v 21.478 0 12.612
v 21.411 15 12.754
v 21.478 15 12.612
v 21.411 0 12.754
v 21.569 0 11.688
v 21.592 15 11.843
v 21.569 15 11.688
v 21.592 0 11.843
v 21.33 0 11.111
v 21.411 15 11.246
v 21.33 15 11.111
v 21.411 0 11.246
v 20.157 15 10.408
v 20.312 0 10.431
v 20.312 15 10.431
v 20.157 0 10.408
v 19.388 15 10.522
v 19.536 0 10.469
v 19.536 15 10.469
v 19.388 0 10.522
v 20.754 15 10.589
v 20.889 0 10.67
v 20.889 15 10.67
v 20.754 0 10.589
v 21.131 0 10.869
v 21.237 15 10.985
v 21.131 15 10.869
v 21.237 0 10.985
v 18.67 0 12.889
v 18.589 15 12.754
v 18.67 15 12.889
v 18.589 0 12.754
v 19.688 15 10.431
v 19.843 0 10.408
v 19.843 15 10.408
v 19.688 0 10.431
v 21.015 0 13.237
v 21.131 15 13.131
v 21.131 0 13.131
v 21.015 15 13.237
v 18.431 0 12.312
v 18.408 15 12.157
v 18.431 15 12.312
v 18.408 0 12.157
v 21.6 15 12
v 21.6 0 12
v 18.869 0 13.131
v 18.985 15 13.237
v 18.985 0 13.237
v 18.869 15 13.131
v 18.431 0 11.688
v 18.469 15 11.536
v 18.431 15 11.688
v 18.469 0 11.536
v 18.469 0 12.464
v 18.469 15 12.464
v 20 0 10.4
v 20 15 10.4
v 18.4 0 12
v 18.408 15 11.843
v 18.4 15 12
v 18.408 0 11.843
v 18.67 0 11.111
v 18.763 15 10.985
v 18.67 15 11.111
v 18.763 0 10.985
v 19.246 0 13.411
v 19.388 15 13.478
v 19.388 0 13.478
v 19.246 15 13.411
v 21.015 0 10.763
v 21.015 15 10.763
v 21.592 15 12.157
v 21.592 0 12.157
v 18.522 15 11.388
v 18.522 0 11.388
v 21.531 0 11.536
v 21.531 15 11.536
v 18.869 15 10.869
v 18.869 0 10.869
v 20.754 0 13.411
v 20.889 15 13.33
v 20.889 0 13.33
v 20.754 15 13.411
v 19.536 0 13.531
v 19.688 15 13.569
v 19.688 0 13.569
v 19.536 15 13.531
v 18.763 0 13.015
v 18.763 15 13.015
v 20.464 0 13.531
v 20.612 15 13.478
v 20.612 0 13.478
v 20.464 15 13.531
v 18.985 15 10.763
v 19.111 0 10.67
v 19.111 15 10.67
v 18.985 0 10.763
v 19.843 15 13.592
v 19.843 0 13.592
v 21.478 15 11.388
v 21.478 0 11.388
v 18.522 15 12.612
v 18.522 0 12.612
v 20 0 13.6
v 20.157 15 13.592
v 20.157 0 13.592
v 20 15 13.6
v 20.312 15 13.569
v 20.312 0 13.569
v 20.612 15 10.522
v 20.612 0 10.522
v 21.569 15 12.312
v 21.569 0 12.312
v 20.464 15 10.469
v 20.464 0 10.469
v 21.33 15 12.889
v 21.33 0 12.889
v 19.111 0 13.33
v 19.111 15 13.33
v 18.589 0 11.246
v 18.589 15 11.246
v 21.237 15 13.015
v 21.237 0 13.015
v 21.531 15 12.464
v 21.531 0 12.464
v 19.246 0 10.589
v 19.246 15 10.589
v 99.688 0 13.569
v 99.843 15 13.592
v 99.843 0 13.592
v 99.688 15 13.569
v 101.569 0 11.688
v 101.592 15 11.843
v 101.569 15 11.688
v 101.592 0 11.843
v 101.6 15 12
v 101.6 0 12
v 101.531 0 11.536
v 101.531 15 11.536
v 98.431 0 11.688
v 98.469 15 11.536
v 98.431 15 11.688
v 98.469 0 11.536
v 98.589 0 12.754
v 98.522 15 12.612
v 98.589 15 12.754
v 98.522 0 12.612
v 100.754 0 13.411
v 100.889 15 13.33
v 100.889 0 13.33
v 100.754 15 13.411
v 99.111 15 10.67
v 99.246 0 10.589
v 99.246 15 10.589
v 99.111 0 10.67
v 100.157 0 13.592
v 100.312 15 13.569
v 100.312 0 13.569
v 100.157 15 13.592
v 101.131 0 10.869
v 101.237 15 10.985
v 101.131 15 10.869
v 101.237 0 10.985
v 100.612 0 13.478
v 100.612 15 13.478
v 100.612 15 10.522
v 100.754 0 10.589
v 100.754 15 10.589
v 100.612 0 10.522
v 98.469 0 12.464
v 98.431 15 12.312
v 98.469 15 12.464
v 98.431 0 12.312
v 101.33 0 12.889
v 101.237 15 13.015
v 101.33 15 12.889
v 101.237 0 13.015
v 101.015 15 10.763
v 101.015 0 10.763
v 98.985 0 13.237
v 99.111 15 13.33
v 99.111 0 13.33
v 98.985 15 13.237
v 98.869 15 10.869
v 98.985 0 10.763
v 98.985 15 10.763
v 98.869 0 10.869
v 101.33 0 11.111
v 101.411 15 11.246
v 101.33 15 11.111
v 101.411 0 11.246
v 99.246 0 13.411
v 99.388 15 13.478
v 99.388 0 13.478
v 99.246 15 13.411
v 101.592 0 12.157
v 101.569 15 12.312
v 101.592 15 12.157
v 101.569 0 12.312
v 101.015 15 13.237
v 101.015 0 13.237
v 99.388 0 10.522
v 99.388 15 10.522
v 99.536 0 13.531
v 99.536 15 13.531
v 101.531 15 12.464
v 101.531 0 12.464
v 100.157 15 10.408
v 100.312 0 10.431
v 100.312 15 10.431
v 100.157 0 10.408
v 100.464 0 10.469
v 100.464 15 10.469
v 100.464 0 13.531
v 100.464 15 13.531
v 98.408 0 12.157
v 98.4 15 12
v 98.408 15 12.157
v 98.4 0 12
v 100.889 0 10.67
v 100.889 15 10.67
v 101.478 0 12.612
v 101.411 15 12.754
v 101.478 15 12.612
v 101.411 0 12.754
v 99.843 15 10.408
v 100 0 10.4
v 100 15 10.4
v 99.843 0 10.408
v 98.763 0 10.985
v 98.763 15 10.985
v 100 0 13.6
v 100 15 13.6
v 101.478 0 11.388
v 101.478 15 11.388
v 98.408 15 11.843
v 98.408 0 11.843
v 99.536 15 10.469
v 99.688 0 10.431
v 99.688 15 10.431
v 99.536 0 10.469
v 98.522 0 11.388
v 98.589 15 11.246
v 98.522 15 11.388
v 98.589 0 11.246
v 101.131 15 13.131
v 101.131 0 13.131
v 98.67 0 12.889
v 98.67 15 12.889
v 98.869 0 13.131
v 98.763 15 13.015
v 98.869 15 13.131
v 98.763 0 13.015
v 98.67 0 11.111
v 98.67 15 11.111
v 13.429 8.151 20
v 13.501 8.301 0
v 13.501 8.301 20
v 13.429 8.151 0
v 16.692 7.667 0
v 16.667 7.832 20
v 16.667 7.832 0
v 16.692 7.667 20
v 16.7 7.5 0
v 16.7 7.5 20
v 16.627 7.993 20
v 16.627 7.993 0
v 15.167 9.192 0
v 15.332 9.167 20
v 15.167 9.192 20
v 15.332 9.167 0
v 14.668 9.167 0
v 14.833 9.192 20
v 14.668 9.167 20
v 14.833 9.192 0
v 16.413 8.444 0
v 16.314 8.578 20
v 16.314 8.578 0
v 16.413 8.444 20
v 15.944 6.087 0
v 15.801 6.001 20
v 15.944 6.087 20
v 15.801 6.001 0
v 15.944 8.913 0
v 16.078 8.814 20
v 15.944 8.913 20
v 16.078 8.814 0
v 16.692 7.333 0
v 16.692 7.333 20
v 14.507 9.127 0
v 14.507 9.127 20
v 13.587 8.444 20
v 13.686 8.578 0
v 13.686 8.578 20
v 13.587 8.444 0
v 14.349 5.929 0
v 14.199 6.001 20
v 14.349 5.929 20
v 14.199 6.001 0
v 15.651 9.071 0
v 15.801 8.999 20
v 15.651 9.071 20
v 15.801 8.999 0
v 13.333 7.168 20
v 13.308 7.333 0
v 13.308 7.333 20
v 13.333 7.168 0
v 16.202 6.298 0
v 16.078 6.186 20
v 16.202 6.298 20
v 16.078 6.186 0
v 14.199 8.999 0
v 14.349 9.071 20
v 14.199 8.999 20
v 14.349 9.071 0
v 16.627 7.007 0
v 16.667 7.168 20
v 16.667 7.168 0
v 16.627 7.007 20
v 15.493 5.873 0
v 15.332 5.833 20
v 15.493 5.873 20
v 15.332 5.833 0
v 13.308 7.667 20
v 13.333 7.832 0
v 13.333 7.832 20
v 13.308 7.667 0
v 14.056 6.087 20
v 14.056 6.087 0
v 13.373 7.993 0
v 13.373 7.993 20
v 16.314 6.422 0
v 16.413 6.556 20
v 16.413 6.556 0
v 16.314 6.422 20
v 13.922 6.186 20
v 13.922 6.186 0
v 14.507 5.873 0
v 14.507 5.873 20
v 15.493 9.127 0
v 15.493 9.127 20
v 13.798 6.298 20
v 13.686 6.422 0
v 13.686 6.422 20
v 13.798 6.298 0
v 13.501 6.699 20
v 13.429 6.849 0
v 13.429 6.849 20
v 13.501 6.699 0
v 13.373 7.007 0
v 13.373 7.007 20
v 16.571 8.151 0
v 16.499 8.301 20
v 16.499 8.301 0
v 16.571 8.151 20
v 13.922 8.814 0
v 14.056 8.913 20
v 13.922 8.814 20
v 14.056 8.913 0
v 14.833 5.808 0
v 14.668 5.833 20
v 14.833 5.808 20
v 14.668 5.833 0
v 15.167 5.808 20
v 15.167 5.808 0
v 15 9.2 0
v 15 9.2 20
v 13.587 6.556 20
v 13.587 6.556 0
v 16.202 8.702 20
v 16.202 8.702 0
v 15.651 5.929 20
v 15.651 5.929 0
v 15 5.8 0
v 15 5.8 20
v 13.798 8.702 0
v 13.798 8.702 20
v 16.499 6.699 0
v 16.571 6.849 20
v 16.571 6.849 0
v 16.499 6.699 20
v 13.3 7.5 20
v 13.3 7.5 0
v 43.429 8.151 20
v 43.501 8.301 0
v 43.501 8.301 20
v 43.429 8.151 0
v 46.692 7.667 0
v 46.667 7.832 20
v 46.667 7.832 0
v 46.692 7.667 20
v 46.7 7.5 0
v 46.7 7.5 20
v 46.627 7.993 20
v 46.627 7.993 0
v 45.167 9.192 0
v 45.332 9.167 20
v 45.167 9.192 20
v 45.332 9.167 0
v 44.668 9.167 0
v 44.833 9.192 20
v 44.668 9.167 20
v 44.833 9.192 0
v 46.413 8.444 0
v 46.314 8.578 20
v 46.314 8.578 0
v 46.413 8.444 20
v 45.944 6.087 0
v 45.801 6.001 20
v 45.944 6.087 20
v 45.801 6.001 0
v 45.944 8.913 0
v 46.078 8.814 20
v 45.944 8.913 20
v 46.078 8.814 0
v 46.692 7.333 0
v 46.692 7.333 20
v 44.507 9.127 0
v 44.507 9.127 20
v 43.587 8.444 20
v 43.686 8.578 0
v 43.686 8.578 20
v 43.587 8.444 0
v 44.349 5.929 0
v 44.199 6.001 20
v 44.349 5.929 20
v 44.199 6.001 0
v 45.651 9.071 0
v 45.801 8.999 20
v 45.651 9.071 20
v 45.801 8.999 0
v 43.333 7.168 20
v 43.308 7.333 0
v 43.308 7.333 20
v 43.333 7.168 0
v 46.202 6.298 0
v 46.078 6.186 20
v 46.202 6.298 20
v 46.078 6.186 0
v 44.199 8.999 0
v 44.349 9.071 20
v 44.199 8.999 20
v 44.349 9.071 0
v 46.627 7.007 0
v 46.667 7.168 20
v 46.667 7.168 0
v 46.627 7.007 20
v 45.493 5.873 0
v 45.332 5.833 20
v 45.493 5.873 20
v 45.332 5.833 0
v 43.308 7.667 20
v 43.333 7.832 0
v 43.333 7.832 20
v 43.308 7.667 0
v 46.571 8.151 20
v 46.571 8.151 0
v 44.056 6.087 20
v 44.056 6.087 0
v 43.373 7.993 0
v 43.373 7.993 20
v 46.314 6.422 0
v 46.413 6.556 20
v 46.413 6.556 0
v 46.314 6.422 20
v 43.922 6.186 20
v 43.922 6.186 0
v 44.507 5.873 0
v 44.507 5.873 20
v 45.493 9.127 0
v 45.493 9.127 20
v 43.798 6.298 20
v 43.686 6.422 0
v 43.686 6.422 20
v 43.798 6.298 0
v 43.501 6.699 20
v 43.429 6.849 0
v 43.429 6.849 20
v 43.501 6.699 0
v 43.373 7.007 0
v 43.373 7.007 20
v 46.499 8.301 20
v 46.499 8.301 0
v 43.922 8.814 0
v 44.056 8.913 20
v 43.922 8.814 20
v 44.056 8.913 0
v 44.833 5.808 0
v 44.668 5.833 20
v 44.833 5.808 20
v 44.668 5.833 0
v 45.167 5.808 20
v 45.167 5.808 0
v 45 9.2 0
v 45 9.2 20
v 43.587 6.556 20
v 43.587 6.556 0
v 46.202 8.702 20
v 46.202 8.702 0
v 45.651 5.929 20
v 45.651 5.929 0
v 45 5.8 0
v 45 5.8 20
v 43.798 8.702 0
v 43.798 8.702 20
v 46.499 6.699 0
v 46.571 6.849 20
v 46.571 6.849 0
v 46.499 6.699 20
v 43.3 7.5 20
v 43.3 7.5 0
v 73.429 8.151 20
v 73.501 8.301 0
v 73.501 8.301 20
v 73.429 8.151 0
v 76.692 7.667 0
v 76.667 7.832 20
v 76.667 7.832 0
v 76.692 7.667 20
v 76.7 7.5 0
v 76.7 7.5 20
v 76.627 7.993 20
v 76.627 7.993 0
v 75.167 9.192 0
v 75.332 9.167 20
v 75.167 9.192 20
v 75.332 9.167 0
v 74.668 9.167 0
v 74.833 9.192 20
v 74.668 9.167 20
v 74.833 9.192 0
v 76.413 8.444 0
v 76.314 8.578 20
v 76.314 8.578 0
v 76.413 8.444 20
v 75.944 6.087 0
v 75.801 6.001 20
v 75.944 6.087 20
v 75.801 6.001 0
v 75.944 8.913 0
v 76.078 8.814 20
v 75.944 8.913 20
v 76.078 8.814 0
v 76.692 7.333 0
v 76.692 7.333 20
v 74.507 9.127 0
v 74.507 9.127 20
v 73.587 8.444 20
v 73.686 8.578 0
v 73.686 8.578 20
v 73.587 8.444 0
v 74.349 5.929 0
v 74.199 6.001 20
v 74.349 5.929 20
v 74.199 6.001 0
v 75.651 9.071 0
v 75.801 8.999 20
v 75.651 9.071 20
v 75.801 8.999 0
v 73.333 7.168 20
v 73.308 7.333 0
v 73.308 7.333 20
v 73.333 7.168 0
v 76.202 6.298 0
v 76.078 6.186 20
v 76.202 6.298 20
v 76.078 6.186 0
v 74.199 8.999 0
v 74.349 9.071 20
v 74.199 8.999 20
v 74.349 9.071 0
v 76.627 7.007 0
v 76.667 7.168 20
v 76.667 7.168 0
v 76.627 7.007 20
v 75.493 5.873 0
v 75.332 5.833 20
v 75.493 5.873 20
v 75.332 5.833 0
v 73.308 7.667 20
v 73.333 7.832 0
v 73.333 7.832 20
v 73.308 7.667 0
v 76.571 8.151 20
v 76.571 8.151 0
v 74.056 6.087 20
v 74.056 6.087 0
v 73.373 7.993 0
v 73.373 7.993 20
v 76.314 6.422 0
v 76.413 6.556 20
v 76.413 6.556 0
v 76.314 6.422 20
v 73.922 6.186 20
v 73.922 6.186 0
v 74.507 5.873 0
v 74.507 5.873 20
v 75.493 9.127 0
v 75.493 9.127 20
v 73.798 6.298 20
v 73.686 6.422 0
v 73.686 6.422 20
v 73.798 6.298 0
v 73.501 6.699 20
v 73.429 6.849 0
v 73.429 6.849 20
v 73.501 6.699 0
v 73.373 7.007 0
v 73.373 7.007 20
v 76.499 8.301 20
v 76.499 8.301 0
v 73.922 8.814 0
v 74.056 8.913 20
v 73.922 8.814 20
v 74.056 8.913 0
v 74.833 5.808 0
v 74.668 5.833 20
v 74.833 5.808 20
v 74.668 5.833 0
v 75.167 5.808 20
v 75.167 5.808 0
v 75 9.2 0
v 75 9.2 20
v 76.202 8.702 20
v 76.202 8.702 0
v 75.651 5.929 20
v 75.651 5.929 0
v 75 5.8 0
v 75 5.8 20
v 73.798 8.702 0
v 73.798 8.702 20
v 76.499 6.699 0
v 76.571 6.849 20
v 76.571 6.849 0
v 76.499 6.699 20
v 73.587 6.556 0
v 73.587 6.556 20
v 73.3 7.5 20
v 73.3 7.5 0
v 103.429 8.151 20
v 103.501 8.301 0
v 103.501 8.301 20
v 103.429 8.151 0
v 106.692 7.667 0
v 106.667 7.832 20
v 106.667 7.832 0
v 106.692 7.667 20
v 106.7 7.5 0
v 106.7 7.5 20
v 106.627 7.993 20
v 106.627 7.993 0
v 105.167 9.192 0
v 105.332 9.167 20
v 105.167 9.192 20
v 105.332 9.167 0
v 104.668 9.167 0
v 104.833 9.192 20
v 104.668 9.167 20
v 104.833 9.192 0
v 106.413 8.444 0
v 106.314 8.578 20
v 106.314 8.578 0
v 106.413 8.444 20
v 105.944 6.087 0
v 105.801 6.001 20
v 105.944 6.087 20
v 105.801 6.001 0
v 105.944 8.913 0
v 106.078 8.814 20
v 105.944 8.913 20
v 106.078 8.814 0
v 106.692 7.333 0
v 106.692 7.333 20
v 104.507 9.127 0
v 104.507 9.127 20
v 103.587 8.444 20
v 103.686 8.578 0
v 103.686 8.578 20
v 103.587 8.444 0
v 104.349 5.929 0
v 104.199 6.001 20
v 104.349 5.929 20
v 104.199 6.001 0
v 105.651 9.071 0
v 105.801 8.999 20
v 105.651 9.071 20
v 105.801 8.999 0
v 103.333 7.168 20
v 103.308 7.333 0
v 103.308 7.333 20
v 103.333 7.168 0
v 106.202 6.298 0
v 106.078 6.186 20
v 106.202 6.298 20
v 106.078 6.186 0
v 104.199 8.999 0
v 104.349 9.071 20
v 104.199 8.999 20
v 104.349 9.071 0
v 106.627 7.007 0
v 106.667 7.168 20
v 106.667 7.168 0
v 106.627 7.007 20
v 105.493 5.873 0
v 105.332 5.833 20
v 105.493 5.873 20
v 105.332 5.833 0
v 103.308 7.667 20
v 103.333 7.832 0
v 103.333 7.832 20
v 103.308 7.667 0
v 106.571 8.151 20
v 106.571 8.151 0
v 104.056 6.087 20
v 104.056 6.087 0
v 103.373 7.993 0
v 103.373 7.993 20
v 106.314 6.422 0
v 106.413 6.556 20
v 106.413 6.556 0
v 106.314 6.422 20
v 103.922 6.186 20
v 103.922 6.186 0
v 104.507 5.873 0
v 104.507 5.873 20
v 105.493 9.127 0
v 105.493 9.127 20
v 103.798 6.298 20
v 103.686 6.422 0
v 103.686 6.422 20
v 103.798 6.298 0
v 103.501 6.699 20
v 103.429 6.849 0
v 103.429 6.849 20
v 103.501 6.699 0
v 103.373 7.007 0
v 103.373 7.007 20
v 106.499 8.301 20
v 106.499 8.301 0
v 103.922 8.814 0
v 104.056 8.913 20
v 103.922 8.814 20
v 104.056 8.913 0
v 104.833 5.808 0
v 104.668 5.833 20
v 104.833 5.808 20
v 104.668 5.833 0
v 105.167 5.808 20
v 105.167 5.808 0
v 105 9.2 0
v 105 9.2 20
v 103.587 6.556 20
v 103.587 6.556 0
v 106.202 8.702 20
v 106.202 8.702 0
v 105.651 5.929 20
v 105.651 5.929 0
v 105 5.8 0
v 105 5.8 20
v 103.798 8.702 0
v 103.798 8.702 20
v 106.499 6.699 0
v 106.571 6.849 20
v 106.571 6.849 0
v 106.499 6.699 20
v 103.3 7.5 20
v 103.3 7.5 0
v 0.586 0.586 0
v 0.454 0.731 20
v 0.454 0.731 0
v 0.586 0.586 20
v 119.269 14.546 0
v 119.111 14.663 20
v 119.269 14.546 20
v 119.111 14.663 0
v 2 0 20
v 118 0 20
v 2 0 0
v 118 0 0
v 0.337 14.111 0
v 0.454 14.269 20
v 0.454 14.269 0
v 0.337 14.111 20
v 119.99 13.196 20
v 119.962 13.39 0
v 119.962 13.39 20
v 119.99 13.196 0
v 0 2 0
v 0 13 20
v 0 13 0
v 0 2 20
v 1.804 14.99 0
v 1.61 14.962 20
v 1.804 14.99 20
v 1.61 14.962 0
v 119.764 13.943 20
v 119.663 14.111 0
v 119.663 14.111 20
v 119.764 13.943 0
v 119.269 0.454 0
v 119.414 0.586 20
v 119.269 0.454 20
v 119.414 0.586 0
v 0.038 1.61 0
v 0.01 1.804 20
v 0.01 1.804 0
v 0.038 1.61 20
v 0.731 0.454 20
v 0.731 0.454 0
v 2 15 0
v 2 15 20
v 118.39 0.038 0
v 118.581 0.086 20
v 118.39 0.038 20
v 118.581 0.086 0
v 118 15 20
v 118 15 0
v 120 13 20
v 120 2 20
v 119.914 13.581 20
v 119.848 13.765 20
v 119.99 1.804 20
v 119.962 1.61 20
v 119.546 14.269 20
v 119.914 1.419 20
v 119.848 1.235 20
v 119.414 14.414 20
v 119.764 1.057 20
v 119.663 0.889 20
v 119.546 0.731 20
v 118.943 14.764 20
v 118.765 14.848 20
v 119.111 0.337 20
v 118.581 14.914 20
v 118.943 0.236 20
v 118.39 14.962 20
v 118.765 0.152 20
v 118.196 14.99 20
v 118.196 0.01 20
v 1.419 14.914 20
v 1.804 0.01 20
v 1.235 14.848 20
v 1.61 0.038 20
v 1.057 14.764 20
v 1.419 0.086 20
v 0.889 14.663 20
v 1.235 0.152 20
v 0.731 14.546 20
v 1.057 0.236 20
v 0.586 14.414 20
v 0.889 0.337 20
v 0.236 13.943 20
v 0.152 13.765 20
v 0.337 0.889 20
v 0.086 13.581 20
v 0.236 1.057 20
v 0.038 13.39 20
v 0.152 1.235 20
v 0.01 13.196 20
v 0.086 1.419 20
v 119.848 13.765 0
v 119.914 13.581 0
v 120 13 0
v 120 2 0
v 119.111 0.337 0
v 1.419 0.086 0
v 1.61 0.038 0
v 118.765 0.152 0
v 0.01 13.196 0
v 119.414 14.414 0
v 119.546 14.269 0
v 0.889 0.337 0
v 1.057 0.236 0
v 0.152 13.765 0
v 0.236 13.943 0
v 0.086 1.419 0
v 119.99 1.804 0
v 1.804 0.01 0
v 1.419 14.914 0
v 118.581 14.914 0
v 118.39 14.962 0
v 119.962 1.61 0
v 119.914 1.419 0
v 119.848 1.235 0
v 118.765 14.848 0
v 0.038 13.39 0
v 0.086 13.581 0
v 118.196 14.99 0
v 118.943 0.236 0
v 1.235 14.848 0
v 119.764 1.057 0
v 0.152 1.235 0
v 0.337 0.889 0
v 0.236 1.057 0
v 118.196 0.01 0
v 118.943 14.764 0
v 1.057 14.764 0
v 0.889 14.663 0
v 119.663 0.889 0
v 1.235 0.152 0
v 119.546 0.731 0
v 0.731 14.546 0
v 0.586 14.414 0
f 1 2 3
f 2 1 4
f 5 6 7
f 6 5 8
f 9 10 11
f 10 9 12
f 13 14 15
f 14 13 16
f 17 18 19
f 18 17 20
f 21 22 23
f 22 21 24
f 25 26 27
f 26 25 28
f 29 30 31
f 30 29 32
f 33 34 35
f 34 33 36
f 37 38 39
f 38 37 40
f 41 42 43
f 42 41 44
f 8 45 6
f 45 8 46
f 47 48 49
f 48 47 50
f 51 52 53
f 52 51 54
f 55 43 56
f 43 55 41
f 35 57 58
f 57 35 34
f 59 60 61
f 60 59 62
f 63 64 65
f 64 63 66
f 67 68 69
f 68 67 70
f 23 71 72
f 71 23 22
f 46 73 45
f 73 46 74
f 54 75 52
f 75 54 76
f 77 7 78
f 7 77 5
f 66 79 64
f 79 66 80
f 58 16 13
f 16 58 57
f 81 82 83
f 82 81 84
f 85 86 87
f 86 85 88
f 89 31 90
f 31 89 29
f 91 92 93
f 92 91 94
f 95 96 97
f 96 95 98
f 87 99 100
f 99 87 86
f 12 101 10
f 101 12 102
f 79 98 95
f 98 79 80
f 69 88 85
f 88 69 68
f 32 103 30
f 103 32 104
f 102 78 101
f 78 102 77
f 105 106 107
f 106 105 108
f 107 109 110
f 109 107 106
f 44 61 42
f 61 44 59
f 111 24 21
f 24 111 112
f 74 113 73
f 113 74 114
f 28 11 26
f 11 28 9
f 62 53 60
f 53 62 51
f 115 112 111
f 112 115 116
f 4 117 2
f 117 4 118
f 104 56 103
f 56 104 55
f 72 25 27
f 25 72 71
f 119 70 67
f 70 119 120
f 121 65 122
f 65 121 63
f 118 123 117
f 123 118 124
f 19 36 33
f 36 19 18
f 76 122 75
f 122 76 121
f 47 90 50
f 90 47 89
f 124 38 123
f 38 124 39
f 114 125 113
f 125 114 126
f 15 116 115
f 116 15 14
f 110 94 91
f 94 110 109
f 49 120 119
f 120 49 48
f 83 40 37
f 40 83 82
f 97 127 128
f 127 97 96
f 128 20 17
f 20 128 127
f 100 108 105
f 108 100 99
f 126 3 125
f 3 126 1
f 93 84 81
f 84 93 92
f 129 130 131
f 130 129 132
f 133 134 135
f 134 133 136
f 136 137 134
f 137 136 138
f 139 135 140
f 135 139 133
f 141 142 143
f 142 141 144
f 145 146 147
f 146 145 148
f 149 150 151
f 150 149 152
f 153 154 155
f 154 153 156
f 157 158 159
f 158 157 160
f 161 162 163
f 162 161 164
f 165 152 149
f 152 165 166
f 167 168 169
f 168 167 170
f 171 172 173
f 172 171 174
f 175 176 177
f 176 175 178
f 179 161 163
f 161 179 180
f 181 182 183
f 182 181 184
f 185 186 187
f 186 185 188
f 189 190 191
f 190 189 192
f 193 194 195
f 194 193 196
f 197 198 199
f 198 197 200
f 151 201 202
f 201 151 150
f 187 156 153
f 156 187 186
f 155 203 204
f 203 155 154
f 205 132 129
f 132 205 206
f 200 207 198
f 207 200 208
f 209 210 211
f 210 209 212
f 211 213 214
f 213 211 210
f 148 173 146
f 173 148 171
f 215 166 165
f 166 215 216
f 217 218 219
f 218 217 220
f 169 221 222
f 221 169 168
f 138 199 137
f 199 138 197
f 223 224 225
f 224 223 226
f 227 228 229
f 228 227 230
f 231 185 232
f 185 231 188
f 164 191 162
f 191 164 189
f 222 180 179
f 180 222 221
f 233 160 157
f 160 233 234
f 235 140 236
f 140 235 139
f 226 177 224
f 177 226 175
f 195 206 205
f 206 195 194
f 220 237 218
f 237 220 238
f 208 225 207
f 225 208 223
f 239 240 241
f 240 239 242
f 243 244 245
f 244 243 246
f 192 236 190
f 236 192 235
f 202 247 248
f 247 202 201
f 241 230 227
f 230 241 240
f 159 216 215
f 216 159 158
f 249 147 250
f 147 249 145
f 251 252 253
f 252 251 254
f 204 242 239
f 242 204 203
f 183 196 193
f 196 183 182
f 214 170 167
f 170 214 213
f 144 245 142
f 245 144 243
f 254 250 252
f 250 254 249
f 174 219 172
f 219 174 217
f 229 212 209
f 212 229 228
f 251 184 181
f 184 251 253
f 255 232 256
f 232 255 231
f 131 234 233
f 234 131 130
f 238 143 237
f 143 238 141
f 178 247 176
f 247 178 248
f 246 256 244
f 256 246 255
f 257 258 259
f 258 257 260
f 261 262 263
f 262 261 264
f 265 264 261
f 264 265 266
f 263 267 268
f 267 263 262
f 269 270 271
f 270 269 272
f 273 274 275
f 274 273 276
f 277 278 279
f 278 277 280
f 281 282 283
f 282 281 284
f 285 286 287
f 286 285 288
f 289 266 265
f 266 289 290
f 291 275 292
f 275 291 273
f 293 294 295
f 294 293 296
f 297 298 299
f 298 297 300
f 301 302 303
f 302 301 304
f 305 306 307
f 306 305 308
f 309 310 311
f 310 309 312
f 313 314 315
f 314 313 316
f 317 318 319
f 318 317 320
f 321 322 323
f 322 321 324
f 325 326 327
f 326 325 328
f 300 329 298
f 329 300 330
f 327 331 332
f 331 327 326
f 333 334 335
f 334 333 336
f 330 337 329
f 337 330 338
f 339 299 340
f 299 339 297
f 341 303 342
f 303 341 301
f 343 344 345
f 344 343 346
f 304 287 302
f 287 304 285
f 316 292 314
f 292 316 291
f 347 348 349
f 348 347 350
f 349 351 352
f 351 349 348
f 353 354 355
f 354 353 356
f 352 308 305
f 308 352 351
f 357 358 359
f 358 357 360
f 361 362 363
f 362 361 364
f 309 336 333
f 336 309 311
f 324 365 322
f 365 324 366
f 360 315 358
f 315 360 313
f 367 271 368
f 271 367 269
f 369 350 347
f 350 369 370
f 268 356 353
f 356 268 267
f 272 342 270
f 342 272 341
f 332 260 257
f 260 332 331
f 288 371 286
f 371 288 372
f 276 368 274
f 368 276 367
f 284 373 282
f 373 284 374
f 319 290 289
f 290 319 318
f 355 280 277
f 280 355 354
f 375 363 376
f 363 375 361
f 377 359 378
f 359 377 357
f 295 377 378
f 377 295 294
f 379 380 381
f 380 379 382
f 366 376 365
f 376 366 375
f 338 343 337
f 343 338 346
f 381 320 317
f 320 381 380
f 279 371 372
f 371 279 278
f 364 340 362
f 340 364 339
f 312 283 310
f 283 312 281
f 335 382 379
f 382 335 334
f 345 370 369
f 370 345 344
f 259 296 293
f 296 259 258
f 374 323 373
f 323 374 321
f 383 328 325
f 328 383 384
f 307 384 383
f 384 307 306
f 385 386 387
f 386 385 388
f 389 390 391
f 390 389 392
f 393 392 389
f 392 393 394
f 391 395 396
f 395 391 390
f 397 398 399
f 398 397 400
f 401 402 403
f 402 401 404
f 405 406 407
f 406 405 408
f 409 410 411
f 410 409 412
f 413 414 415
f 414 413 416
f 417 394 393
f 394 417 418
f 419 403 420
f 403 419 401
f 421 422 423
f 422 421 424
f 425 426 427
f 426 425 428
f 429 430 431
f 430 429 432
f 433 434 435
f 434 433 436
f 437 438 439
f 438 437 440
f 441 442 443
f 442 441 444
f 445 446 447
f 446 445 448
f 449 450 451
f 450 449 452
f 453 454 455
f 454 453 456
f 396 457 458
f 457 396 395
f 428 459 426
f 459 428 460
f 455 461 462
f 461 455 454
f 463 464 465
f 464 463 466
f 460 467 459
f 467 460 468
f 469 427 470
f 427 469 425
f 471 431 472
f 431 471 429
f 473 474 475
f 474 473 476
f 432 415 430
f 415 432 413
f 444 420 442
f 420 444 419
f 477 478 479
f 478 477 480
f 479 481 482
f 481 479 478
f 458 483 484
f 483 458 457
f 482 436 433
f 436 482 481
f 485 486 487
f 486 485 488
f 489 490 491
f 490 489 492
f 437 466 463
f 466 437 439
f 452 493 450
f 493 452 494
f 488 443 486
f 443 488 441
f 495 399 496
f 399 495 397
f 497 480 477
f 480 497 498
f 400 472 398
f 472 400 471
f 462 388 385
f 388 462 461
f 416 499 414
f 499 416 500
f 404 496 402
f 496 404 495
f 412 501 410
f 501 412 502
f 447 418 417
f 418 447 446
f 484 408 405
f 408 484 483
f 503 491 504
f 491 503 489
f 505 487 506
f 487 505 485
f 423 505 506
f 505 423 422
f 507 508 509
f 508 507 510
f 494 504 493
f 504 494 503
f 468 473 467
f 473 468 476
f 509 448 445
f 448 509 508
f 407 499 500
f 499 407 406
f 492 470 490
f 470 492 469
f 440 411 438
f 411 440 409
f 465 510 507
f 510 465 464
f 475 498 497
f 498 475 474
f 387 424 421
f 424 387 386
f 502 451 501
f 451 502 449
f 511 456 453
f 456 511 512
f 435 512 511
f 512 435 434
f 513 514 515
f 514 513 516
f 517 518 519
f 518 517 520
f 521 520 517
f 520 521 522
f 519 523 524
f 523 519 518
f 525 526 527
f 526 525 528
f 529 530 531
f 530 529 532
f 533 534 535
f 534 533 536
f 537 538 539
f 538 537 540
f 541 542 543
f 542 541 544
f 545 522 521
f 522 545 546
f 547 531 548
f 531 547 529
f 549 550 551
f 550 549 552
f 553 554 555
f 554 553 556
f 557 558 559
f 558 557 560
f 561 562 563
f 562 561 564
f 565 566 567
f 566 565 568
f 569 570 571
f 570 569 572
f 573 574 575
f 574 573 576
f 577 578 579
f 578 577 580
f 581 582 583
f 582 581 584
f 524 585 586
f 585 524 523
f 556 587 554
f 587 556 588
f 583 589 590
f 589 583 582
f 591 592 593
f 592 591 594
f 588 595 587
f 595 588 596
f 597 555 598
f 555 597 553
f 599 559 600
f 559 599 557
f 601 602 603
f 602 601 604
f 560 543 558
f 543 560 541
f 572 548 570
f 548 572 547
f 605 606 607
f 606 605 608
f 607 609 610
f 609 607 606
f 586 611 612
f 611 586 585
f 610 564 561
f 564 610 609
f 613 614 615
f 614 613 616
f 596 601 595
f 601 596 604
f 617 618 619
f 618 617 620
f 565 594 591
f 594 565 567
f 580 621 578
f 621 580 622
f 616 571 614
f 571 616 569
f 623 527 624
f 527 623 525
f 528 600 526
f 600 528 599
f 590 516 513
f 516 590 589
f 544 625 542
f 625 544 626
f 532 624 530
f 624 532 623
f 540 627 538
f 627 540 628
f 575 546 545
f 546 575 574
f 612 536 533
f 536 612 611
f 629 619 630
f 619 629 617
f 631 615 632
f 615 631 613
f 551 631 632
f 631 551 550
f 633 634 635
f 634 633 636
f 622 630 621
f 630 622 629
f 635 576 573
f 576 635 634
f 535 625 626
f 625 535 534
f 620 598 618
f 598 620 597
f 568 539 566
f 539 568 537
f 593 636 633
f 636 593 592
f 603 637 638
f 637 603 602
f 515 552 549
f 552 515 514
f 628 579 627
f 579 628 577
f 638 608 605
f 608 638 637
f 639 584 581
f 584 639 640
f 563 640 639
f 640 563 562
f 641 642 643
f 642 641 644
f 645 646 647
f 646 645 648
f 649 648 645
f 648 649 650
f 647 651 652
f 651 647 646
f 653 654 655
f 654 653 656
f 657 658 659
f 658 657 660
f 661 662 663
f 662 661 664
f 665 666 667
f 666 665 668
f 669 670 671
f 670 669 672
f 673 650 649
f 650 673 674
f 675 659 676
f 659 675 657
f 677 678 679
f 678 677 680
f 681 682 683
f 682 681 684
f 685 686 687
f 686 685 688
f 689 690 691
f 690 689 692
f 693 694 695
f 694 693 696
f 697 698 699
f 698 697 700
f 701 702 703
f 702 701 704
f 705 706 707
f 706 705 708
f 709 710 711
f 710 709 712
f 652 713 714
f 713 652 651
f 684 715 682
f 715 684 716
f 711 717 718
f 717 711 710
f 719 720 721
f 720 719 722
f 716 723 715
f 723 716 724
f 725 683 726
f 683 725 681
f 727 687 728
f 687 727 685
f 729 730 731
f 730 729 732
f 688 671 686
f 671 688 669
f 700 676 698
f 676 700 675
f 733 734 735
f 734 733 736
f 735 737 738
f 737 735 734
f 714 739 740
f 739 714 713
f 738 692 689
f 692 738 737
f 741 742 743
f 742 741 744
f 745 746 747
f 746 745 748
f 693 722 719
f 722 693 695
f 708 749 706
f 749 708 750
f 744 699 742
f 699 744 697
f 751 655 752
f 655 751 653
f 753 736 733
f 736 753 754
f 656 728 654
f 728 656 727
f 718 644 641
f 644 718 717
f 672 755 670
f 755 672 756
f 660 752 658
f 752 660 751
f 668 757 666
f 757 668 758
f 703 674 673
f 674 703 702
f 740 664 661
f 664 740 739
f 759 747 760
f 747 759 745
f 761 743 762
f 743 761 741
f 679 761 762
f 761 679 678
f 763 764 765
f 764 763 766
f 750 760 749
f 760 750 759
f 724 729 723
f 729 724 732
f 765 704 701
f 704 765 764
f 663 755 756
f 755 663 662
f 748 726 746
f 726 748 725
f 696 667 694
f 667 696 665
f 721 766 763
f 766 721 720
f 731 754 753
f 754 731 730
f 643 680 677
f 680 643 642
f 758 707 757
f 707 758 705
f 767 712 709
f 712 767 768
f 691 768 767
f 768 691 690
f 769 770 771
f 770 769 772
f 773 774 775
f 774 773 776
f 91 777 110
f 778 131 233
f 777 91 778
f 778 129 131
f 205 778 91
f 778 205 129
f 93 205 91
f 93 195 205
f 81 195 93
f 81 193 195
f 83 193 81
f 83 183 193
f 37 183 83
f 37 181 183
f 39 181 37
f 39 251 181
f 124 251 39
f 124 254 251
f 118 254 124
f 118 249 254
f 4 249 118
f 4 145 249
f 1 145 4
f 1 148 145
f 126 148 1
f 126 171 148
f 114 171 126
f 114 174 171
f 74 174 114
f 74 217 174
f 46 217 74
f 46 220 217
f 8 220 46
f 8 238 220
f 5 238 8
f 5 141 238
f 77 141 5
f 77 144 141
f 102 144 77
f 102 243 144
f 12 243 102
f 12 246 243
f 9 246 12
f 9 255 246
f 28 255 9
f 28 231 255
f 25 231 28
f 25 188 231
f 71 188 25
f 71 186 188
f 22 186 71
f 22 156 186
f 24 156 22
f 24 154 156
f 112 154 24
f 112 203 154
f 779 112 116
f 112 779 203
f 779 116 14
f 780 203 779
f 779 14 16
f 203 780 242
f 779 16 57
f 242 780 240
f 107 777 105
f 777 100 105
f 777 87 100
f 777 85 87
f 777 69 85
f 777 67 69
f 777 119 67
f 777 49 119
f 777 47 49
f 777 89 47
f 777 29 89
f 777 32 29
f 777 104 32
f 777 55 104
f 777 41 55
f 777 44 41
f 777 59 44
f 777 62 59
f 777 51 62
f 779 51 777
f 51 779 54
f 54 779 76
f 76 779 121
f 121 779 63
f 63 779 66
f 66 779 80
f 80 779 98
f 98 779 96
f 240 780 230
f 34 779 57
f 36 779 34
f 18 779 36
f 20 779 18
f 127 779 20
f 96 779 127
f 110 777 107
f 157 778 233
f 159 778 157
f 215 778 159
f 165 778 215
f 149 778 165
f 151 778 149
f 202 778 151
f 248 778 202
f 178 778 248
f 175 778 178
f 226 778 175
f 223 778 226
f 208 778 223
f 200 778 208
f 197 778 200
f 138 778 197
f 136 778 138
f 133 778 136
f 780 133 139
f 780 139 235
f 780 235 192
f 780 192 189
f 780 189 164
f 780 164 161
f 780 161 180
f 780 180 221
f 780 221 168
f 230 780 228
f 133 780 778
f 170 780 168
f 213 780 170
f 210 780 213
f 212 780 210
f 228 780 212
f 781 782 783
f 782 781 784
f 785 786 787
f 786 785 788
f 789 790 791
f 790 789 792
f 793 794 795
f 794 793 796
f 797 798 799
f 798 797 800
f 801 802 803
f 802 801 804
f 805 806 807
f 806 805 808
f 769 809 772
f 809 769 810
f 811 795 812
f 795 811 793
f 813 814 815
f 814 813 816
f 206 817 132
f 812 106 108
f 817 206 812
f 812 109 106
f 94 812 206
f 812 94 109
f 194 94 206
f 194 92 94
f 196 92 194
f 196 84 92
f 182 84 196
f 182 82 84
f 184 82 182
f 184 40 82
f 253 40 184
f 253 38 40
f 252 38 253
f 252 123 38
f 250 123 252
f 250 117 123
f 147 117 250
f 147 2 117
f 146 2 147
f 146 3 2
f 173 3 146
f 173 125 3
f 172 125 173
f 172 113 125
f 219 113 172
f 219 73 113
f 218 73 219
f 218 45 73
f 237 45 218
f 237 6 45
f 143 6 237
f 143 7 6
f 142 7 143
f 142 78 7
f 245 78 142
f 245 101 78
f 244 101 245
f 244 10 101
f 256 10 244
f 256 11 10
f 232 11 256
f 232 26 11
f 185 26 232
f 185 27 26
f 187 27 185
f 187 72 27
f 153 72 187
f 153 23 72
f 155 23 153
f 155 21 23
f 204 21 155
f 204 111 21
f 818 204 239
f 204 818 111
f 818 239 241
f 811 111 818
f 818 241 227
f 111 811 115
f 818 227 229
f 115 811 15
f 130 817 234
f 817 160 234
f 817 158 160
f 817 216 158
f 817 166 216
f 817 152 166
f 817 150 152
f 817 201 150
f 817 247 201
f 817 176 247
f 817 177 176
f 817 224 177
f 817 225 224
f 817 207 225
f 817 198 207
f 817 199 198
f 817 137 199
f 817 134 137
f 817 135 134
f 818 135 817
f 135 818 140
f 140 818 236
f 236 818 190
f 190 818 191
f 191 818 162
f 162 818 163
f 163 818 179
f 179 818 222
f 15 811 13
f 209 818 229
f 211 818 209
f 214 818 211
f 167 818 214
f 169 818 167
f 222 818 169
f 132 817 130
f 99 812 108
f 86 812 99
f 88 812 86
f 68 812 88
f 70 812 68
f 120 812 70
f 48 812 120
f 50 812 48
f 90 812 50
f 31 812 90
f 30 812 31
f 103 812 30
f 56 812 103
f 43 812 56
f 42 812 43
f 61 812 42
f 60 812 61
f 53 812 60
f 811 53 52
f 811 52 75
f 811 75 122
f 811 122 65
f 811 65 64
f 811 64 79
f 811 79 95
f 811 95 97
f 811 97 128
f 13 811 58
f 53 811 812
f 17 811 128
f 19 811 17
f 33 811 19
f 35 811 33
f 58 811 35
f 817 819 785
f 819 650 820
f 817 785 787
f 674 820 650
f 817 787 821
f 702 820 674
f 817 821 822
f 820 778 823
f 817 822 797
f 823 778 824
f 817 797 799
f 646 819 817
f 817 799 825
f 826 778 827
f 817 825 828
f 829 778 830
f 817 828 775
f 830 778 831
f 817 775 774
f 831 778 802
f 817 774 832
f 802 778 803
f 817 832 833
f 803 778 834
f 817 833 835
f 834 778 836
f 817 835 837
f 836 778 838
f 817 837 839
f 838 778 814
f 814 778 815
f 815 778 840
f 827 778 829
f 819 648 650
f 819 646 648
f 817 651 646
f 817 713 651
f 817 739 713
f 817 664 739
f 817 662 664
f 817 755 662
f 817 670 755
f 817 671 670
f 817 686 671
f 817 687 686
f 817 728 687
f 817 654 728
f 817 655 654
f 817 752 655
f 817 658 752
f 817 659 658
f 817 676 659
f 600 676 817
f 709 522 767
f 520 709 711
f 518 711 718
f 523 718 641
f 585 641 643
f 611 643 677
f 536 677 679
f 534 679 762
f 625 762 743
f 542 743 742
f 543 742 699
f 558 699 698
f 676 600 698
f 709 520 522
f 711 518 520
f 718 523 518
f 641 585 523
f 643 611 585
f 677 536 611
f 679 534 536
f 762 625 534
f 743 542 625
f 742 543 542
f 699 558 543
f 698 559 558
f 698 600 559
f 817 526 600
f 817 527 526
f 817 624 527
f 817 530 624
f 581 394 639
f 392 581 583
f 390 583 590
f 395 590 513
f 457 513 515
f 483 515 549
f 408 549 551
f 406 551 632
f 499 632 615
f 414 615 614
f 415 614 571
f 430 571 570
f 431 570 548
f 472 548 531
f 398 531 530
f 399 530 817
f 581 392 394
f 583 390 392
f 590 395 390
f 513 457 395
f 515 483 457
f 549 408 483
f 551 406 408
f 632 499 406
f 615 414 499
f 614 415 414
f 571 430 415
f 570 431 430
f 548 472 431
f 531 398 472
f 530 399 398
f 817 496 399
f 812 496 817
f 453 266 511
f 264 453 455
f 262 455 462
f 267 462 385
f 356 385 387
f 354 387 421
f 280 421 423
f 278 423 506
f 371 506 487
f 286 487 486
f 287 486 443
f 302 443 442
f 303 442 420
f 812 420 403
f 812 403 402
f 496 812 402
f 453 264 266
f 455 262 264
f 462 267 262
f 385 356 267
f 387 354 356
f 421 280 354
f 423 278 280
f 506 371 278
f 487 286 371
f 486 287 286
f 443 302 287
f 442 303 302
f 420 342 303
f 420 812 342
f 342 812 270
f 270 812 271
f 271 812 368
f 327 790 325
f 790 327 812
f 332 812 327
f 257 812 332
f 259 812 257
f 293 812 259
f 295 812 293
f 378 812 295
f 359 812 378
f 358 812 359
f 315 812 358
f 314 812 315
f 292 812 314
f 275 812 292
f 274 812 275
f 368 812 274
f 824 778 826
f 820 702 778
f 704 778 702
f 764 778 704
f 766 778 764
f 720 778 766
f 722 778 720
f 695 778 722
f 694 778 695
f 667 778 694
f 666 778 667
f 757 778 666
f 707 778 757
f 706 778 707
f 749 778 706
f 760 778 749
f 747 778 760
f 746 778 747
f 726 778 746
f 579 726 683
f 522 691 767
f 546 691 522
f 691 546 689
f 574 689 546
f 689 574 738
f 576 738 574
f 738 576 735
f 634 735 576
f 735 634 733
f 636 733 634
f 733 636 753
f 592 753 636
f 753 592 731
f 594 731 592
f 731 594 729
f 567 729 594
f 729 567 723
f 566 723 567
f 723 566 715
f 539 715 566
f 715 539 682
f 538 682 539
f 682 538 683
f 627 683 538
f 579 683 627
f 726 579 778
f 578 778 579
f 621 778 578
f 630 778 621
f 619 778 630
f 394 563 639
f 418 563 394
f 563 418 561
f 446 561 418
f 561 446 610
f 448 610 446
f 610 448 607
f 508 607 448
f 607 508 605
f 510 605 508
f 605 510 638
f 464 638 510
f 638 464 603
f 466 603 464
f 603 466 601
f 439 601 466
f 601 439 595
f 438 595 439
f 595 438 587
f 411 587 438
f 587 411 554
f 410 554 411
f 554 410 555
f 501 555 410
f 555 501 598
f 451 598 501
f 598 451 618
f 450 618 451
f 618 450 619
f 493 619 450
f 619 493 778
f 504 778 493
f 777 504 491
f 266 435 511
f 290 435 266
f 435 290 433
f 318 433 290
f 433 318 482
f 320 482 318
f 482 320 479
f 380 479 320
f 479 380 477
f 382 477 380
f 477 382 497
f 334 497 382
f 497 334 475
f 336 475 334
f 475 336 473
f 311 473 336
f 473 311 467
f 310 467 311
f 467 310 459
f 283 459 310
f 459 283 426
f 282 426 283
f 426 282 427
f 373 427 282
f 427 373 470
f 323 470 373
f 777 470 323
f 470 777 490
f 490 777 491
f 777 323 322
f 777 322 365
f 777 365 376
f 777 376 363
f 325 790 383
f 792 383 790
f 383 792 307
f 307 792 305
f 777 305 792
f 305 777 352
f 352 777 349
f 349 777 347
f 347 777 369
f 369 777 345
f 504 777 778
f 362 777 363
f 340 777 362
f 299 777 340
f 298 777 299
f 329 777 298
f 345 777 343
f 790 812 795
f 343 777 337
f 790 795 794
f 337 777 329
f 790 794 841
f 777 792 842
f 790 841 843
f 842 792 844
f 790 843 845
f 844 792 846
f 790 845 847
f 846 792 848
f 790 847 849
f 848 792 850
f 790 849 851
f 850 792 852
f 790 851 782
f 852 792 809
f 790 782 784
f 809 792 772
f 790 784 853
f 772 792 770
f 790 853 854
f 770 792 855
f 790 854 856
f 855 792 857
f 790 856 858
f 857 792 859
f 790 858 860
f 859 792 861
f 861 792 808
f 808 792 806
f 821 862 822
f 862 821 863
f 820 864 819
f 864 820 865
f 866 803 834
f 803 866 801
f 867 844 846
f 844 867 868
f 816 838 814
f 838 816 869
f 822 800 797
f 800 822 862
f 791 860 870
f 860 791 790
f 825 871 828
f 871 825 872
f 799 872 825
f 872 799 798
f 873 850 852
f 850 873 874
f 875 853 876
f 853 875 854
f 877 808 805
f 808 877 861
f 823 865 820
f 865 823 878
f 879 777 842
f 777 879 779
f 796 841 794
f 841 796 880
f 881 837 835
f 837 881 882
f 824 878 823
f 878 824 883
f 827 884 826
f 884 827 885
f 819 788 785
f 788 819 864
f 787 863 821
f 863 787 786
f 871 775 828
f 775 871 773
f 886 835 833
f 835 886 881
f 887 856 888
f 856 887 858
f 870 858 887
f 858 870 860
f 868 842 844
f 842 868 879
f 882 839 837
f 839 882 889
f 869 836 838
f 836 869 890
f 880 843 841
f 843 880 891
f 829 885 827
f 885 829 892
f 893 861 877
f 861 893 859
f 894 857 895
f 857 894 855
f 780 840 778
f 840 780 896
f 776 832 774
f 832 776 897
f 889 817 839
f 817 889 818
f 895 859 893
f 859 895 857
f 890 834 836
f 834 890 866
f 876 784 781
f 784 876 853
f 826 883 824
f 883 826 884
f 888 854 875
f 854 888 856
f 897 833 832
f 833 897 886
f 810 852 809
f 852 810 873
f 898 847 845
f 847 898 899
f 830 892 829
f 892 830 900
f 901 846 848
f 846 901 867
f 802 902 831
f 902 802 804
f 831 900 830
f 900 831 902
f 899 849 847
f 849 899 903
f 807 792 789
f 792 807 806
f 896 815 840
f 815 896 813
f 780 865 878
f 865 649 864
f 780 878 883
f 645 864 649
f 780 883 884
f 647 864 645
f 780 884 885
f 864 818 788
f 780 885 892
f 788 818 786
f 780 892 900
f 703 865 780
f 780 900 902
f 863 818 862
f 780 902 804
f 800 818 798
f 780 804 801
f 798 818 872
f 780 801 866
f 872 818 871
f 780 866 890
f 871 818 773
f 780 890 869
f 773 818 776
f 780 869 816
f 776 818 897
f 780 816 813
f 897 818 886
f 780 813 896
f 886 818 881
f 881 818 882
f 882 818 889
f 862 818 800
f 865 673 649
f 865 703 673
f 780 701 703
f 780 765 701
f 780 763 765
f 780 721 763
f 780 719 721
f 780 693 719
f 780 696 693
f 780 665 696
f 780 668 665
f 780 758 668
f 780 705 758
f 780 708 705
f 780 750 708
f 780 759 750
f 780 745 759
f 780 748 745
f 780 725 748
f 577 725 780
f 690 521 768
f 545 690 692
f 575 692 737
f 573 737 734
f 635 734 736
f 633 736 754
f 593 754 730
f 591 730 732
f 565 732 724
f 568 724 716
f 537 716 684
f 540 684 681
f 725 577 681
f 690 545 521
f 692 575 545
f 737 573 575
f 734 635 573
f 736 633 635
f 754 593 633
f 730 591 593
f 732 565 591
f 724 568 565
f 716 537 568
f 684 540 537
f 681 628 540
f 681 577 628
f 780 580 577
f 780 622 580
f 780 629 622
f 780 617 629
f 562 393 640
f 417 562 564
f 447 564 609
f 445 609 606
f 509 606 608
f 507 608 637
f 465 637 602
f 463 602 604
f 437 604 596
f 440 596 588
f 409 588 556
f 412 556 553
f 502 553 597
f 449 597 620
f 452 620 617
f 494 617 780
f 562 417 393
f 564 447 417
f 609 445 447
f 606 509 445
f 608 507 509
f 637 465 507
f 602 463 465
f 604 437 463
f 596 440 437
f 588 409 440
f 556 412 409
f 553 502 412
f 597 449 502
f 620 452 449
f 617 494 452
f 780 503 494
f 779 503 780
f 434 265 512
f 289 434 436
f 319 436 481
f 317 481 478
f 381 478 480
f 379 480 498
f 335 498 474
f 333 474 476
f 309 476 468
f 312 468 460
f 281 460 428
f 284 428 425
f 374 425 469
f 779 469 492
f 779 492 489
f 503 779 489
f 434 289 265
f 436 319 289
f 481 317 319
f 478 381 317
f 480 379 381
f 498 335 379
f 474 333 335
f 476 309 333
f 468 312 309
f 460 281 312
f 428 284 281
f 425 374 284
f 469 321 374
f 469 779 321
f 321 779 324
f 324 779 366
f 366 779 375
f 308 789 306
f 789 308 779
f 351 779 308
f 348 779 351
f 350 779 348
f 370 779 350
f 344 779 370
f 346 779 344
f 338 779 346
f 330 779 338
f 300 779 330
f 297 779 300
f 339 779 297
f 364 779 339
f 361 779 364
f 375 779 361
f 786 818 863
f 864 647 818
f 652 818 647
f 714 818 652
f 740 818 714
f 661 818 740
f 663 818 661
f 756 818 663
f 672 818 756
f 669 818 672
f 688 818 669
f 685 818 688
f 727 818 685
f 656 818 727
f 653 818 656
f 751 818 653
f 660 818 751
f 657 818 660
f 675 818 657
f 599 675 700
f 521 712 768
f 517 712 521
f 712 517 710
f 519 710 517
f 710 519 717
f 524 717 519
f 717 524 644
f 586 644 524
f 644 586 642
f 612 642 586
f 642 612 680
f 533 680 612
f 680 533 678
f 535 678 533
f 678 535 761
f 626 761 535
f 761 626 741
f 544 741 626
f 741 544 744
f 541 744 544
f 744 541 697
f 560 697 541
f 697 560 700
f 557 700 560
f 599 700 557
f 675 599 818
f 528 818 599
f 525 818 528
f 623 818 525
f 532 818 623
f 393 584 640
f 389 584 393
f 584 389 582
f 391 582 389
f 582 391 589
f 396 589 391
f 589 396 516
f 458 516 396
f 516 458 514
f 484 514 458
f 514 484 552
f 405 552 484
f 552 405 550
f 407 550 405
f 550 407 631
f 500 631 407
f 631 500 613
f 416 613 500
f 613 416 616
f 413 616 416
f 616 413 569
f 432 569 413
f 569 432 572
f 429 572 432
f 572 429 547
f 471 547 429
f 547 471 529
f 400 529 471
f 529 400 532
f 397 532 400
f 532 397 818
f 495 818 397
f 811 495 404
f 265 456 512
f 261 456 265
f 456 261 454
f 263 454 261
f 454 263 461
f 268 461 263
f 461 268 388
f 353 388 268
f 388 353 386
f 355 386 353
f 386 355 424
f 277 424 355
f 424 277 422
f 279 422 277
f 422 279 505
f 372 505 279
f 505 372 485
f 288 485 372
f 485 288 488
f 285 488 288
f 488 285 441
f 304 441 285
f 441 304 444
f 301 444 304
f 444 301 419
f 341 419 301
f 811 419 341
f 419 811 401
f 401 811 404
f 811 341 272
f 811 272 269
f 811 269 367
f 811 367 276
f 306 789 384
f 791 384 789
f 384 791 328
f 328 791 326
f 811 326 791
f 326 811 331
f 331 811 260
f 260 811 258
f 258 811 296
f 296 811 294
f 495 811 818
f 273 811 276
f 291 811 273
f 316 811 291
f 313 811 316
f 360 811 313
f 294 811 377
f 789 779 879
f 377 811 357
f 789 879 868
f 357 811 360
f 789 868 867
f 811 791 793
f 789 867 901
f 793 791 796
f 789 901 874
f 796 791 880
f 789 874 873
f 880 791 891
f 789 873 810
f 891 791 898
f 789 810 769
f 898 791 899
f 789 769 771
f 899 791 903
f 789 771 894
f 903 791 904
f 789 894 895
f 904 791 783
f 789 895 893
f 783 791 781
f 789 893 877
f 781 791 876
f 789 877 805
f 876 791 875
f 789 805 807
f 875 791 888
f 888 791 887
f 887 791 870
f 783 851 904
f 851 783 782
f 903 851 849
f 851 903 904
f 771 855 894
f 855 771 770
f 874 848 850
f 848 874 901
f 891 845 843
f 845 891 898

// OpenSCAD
// file: params.scad
// Cat Feeder 5000 — Shared Parameters & Common Modules
// Include this file first in all part files: include <params.scad>

// ===== DIMENSIONS =====
WALL = 3;                // Standard wall thickness (mm)
THIN_WALL = 2.5;         // Thin walls (antenna arch, etc.)
FLOOR = 4;               // Base floor thickness
INSERT_BORE = 4.7;       // M3 heat-set insert pocket bore
M3_CLEAR = 3.4;          // M3 clearance hole
UNIT_W = 160;            // Main body width
UNIT_D = 240;            // Main body depth
UNIT_H = 160;            // Main body height
GATE_W = 118;            // Gate flap width
GATE_H = 90;             // Gate flap height
GATE_T = 3;              // Gate flap thickness
GATE_ROD_D = 3.2;        // Gate hinge rod diameter
ARCH_SPAN = 160;         // Antenna arch left-to-right span
ARCH_H = 70;             // Antenna arch height
ARCH_D = 40;             // Antenna arch depth (front-to-back)
COIL_CH_W = 16;          // Coil channel width
COIL_CH_D = 5;           // Coil channel depth
SERVO_W = 23;            // SG90 servo width
SERVO_D = 12.5;          // SG90 servo depth
SERVO_H = 30;            // SG90 servo height
SERVO_EAR_SPAN = 28;     // SG90 servo ear spacing
TOLERANCE = 0.1;         // General fit tolerance

// ===== RENDER QUALITY =====
$fn = 64;                // Circle resolution (smooth curves)

// ===== COLORS =====
COL_RFID = [0.8, 0.2, 0.2, 0.8];      // Red — RFID antenna arch
COL_TPU = [0.4, 0.7, 0.3, 0.8];       // Green — TPU flexible parts
COL_GATE = [0.2, 0.5, 0.8, 0.8];      // Blue — Gate mechanism
COL_BODY = [0.6, 0.6, 0.6, 0.8];      // Gray — Main body structure

// ===== COMMON MODULES =====

// M3 heat-set insert pocket (bore hole for pressed insert)
module m3_insert(h = 8) {
    cylinder(d = INSERT_BORE, h = h);
}

// M3 clearance hole (for bolt pass-through)
module m3_clear(h = 8) {
    cylinder(d = M3_CLEAR, h = h);
}

// Fillet box: rectangular box with filleted corners
// w, d, h = width, depth, height; r = corner radius
module fillet_box(w, d, h, r = 2) {
    hull() {
        translate([r, r, 0])
            cylinder(r = r, h = h);
        translate([w - r, r, 0])
            cylinder(r = r, h = h);
        translate([r, d - r, 0])
            cylinder(r = r, h = h);
        translate([w - r, d - r, 0])
            cylinder(r = r, h = h);
    }
}

// Boss: raised circular pad with M3 pocket
// Useful for internal reinforcement at bolt points
module boss(d = 10, h = 4, pocket = true) {
    difference() {
        cylinder(d = d, h = h);
        if (pocket)
            translate([0, 0, -0.1])
                m3_clear(h = h + 0.2);
    }
}
// main file
// Cat Feeder 5000 — Part 14: Gate Top Hinge Mount
// Fixed to top of bowl opening. Holds hinge rod for swing-up gate flap.
// Print: PETG, 0.2mm layers, 40% infill, no supports

include <params.scad>

color(COL_GATE) gate_hinge_mount();

module gate_hinge_mount() {
    HW = 120; HH = 20; HD = 15;
    ROD_H = 8;  // Rod center height from top of mount (measured from top face)

    difference() {
        fillet_box(HW, HD, HH, r=2);
        // Hinge rod bores (×2, matching gate flap rod holes at x=20 and x=100)
        for (x = [20, HW - 20])
            translate([x, -0.1, HH - ROD_H])
                rotate([-90, 0, 0])
                    cylinder(d=GATE_ROD_D, h=HD + 0.2);
        // Body attachment holes (M3 clearance, ×4 evenly spaced)
        for (x = [15, 45, 75, 105])
            translate([x, HD/2, -0.1])
                m3_clear(h=HH + 0.2);
    }
}
